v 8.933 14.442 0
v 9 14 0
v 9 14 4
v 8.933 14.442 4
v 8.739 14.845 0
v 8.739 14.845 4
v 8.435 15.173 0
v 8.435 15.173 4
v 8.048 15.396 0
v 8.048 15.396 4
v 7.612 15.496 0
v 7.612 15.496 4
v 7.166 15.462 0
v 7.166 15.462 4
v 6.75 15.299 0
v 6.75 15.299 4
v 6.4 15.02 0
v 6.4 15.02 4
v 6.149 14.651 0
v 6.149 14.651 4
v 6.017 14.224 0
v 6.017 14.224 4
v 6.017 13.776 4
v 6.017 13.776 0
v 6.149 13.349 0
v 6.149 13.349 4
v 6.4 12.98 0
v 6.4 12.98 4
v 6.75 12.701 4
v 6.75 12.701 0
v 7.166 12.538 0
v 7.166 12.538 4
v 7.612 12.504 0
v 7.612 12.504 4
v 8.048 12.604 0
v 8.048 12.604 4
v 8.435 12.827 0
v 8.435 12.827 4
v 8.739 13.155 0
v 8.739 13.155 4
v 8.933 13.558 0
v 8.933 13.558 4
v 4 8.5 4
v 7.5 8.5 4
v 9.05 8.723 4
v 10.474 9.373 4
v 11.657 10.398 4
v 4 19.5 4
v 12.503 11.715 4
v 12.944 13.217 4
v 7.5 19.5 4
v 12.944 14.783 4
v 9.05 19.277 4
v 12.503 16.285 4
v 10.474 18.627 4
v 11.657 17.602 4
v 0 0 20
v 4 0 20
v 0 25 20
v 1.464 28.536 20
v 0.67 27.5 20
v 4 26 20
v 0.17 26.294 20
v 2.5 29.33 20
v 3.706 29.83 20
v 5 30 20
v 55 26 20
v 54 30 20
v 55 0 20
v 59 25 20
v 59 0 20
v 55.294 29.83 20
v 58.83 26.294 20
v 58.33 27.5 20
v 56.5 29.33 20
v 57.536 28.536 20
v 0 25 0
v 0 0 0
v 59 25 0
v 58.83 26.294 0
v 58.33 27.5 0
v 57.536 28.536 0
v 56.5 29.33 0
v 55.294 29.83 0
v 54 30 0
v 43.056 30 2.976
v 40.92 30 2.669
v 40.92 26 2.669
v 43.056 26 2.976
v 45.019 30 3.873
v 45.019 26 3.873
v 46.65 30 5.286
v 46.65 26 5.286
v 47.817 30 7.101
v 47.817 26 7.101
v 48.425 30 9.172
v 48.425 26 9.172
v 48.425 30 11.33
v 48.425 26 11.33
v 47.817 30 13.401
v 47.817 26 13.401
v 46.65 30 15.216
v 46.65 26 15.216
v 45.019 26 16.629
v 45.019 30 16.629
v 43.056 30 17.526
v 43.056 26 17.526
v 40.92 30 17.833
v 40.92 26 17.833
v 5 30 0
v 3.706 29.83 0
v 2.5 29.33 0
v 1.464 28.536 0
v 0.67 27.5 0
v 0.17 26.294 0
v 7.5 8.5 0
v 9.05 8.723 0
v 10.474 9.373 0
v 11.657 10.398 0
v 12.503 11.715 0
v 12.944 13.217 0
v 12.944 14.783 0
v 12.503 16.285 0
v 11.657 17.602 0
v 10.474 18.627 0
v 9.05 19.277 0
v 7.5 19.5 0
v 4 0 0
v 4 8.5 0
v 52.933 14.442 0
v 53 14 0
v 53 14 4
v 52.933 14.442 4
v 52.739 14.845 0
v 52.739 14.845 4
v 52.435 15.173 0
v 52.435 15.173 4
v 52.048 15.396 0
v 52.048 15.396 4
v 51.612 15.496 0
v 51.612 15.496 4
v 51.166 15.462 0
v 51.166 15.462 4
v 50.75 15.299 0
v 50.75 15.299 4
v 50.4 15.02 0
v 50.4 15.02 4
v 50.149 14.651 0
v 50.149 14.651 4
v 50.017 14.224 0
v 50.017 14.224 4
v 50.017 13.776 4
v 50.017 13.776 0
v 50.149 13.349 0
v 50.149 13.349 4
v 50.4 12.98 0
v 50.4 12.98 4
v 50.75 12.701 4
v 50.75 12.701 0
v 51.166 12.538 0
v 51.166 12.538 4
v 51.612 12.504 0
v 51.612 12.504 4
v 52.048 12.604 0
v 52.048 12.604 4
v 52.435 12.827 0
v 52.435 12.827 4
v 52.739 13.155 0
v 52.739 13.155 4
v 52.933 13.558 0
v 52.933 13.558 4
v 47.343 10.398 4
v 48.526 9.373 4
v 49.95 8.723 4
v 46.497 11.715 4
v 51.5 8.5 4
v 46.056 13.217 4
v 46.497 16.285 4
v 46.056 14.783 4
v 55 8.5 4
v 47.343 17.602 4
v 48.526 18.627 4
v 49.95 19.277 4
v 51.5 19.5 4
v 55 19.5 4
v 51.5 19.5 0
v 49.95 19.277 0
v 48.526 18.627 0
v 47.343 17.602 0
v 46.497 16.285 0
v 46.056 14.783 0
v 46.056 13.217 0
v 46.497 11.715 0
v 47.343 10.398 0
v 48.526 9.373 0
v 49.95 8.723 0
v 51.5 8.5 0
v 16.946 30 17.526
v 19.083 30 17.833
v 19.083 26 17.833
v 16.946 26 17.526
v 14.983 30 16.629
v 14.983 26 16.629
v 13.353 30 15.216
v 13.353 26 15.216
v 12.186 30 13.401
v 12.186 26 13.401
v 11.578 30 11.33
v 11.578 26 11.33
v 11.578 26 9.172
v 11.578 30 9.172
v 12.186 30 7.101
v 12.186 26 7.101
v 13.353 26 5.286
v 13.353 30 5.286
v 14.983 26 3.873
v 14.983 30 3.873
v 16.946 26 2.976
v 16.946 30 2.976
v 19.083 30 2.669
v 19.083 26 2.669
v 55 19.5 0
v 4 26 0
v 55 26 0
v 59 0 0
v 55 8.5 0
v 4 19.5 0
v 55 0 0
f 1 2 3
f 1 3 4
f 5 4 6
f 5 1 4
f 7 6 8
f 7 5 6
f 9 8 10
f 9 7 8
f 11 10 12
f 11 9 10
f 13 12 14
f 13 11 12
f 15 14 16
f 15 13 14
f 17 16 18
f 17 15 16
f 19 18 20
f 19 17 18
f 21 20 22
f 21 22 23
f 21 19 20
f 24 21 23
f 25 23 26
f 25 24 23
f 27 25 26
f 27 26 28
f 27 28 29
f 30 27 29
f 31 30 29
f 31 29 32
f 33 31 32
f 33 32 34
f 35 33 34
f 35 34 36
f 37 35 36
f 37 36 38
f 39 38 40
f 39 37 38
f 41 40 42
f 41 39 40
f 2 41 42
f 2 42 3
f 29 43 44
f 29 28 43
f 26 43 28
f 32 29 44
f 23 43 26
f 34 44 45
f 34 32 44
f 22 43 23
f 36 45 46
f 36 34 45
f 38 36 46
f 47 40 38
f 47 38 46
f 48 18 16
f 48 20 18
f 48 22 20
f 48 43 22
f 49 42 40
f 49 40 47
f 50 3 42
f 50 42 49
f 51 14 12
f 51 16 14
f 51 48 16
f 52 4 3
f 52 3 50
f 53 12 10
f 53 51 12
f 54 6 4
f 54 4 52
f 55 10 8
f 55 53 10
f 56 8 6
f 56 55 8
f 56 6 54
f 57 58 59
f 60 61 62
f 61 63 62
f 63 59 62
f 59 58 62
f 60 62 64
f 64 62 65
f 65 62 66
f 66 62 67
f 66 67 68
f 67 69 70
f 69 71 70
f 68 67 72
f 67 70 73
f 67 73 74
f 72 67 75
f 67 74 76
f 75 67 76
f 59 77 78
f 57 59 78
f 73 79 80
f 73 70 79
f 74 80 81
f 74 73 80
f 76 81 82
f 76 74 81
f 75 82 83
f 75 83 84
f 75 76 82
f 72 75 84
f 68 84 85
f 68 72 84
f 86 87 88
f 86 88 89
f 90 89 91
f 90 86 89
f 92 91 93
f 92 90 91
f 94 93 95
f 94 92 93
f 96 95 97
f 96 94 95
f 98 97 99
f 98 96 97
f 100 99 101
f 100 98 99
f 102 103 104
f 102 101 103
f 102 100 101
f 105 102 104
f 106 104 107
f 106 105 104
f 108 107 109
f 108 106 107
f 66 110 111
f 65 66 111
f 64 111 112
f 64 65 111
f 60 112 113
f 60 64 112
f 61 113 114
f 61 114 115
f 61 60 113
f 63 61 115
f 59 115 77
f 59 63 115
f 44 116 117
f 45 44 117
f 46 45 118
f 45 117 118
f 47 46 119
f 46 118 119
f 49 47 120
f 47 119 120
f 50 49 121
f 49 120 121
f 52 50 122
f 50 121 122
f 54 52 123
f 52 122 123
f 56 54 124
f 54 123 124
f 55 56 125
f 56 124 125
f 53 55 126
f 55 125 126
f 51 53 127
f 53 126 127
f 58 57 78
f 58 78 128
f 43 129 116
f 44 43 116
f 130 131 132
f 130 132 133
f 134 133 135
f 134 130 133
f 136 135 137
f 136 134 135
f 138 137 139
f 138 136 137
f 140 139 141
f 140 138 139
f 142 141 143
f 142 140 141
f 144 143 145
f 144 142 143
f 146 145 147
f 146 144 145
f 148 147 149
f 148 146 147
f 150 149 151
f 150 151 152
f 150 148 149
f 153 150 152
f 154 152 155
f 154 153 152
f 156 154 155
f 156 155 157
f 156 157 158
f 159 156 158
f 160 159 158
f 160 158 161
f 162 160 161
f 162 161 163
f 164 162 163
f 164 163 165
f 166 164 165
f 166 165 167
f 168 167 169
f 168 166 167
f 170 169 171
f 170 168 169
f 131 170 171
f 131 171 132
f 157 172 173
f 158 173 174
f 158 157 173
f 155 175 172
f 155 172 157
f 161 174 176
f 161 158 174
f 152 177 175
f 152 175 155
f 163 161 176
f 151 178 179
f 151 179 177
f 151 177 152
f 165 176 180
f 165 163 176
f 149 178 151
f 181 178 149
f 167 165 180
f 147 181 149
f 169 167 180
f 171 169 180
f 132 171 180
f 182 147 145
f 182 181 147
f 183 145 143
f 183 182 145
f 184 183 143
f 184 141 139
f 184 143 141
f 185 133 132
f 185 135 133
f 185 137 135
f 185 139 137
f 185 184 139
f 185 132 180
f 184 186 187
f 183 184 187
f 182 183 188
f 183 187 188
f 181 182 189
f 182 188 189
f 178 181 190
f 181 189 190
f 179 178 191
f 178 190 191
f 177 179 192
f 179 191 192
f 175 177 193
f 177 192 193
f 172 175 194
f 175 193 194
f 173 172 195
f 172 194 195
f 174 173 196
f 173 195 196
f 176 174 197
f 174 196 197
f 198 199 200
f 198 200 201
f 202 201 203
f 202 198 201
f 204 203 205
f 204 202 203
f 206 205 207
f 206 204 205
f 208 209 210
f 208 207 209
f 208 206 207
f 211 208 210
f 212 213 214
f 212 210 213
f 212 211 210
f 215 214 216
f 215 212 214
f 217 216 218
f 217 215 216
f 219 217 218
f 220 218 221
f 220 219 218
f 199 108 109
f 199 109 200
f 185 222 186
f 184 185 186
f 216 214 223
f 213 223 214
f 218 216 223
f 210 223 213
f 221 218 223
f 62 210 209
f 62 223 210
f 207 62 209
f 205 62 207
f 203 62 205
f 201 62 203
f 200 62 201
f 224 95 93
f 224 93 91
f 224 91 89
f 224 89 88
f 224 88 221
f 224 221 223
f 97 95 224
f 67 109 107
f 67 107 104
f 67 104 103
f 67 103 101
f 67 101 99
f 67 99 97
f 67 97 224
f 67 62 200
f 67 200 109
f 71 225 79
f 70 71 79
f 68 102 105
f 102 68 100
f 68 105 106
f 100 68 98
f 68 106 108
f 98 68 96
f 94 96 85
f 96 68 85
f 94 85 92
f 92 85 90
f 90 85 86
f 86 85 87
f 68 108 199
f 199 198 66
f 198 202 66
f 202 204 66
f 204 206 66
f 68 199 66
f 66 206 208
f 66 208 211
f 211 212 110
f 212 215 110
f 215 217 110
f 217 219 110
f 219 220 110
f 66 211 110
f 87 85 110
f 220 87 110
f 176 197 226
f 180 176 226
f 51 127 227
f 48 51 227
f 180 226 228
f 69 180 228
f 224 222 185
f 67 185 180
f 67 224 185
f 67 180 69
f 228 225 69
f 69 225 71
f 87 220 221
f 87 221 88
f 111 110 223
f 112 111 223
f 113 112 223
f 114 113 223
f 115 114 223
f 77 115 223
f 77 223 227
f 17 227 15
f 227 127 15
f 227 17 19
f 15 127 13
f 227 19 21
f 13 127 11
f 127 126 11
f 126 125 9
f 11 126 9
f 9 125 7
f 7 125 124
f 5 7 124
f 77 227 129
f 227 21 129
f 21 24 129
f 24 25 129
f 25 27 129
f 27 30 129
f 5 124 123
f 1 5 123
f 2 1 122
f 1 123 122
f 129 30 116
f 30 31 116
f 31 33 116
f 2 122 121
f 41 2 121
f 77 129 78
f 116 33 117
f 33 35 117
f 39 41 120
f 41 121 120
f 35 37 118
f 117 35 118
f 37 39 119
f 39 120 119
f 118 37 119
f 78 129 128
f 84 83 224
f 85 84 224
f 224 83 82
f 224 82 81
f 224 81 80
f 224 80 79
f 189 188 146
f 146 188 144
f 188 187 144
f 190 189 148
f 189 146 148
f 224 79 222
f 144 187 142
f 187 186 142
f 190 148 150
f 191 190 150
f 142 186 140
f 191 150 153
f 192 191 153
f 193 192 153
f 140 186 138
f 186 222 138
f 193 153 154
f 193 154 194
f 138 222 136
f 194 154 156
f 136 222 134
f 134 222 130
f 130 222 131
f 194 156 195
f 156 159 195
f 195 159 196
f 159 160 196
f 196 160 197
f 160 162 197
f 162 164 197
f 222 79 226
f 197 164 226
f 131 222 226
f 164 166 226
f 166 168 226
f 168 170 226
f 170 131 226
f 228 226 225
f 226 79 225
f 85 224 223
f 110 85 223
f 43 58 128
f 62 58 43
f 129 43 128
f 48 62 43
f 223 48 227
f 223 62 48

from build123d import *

# Parameters (mm, degrees)
SKETCH_1_R          = 1.5
EXTRUDE_1_DEPTH     = 4
EXTRUDE_1_2_DEPTH   = 4
EXTRUDE_2_DEPTH     = 20
FILLET_2_R          = 5
SKETCH_4_W          = 55
SKETCH_4_H          = 20
EXTRUDE_3_DEPTH     = 2
EXTRUDE_4_DEPTH     = 2
EXTRUDE_5_DEPTH     = 2
CUT_EXTRUDE_2_DEPTH = 7


with BuildPart() as part:
    # 草图1 → 凸台-拉伸1 (new body)
    with BuildSketch(Plane.XY):
        with BuildLine():
            Line((2, 19.5), (2, 8.5))
            Line((2, 8.5), (7.5, 8.5))
            ThreePointArc((7.5, 8.5), (13, 14), (7.5, 19.5))
            Line((7.5, 19.5), (2, 19.5))
        make_face()
        with Locations((7.5, 14)):
            Circle(SKETCH_1_R, mode=Mode.SUBTRACT)
    extrude(amount=EXTRUDE_1_DEPTH)



with BuildPart() as body_2:
    # 草图1 → Extrude 1 2 (new body)
    with BuildSketch(Plane.XY):
        with BuildLine():
            Line((51.5, 8.5), (57, 8.5))
            Line((57, 8.5), (57, 19.5))
            Line((57, 19.5), (51.5, 19.5))
            ThreePointArc((51.5, 19.5), (46, 14), (51.5, 8.5))
        make_face()
        with Locations((51.5, 14)):
            Circle(SKETCH_1_R, mode=Mode.SUBTRACT)
    extrude(amount=EXTRUDE_1_2_DEPTH)


with BuildPart() as part_1:
    add(part.part)

    add(body_2.part)  # 凸台-拉伸2 merges body 2
    # 草图1<3> → 凸台-拉伸2 (add)
    with BuildSketch(Plane.XY):
        Polygon((0, 30), (0, 0), (2, 0), (2, 8.5), (2, 19.5), (2, 28), (57, 28), (57, 19.5), (57, 8.5), (57, 0), (59, 0), (59, 30), align=None)
    extrude(amount=EXTRUDE_2_DEPTH)

    # 圆角2
    fillet_2_edges = [part_1.edges().sort_by_distance(p)[0] for p in [
        (59, 30, 10),
        (0, 30, 10),
    ]]
    fillet(fillet_2_edges, radius=FILLET_2_R)

    # 草图4 → 凸台-拉伸3 (add)
    with BuildSketch(Plane.XZ.offset(-28)):
        with Locations((29.5, 10)):
            Rectangle(SKETCH_4_W, SKETCH_4_H)
    extrude(amount=EXTRUDE_3_DEPTH)

    # 草图5 → 凸台-拉伸4 (add)
    with BuildSketch(Plane(origin=(2, 0, 0), x_dir=(0, 0, -1), z_dir=(1, 0, 0))):
        Polygon((0, 8.5), (-4, 8.5), (-4, 19.5), (0, 19.5), (0, 26), (-20, 26), (-20, 0), (0, 0), align=None)
    extrude(amount=EXTRUDE_4_DEPTH)

    # 草图7 → 凸台-拉伸5 (add)
    with BuildSketch(Plane.ZY.offset(-57)):
        Polygon((0, 19.5), (4, 19.5), (4, 8.5), (0, 8.5), (0, 0), (20, 0), (20, 26), (0, 26), align=None)
    extrude(amount=EXTRUDE_5_DEPTH)

    # 草图8 → 切除-拉伸2 (cut)
    with BuildSketch(Plane(origin=(0, 30, 0), x_dir=(1, 0, 0), z_dir=(0, 1, 0))):
        with BuildLine():
            Line((40.92, -17.832853898), (19.082552531, -17.832853898))
            ThreePointArc((19.082552531, -17.832853898), (11.500622297, -10.250923663), (19.082552531, -2.668993429))
            Line((19.082552531, -2.668993429), (40.92, -2.668993429))
            ThreePointArc((40.92, -2.668993429), (48.501930234, -10.250923663), (40.92, -17.832853898))
        make_face()
    extrude(amount=-CUT_EXTRUDE_2_DEPTH, mode=Mode.SUBTRACT)


solid = part_1.part
